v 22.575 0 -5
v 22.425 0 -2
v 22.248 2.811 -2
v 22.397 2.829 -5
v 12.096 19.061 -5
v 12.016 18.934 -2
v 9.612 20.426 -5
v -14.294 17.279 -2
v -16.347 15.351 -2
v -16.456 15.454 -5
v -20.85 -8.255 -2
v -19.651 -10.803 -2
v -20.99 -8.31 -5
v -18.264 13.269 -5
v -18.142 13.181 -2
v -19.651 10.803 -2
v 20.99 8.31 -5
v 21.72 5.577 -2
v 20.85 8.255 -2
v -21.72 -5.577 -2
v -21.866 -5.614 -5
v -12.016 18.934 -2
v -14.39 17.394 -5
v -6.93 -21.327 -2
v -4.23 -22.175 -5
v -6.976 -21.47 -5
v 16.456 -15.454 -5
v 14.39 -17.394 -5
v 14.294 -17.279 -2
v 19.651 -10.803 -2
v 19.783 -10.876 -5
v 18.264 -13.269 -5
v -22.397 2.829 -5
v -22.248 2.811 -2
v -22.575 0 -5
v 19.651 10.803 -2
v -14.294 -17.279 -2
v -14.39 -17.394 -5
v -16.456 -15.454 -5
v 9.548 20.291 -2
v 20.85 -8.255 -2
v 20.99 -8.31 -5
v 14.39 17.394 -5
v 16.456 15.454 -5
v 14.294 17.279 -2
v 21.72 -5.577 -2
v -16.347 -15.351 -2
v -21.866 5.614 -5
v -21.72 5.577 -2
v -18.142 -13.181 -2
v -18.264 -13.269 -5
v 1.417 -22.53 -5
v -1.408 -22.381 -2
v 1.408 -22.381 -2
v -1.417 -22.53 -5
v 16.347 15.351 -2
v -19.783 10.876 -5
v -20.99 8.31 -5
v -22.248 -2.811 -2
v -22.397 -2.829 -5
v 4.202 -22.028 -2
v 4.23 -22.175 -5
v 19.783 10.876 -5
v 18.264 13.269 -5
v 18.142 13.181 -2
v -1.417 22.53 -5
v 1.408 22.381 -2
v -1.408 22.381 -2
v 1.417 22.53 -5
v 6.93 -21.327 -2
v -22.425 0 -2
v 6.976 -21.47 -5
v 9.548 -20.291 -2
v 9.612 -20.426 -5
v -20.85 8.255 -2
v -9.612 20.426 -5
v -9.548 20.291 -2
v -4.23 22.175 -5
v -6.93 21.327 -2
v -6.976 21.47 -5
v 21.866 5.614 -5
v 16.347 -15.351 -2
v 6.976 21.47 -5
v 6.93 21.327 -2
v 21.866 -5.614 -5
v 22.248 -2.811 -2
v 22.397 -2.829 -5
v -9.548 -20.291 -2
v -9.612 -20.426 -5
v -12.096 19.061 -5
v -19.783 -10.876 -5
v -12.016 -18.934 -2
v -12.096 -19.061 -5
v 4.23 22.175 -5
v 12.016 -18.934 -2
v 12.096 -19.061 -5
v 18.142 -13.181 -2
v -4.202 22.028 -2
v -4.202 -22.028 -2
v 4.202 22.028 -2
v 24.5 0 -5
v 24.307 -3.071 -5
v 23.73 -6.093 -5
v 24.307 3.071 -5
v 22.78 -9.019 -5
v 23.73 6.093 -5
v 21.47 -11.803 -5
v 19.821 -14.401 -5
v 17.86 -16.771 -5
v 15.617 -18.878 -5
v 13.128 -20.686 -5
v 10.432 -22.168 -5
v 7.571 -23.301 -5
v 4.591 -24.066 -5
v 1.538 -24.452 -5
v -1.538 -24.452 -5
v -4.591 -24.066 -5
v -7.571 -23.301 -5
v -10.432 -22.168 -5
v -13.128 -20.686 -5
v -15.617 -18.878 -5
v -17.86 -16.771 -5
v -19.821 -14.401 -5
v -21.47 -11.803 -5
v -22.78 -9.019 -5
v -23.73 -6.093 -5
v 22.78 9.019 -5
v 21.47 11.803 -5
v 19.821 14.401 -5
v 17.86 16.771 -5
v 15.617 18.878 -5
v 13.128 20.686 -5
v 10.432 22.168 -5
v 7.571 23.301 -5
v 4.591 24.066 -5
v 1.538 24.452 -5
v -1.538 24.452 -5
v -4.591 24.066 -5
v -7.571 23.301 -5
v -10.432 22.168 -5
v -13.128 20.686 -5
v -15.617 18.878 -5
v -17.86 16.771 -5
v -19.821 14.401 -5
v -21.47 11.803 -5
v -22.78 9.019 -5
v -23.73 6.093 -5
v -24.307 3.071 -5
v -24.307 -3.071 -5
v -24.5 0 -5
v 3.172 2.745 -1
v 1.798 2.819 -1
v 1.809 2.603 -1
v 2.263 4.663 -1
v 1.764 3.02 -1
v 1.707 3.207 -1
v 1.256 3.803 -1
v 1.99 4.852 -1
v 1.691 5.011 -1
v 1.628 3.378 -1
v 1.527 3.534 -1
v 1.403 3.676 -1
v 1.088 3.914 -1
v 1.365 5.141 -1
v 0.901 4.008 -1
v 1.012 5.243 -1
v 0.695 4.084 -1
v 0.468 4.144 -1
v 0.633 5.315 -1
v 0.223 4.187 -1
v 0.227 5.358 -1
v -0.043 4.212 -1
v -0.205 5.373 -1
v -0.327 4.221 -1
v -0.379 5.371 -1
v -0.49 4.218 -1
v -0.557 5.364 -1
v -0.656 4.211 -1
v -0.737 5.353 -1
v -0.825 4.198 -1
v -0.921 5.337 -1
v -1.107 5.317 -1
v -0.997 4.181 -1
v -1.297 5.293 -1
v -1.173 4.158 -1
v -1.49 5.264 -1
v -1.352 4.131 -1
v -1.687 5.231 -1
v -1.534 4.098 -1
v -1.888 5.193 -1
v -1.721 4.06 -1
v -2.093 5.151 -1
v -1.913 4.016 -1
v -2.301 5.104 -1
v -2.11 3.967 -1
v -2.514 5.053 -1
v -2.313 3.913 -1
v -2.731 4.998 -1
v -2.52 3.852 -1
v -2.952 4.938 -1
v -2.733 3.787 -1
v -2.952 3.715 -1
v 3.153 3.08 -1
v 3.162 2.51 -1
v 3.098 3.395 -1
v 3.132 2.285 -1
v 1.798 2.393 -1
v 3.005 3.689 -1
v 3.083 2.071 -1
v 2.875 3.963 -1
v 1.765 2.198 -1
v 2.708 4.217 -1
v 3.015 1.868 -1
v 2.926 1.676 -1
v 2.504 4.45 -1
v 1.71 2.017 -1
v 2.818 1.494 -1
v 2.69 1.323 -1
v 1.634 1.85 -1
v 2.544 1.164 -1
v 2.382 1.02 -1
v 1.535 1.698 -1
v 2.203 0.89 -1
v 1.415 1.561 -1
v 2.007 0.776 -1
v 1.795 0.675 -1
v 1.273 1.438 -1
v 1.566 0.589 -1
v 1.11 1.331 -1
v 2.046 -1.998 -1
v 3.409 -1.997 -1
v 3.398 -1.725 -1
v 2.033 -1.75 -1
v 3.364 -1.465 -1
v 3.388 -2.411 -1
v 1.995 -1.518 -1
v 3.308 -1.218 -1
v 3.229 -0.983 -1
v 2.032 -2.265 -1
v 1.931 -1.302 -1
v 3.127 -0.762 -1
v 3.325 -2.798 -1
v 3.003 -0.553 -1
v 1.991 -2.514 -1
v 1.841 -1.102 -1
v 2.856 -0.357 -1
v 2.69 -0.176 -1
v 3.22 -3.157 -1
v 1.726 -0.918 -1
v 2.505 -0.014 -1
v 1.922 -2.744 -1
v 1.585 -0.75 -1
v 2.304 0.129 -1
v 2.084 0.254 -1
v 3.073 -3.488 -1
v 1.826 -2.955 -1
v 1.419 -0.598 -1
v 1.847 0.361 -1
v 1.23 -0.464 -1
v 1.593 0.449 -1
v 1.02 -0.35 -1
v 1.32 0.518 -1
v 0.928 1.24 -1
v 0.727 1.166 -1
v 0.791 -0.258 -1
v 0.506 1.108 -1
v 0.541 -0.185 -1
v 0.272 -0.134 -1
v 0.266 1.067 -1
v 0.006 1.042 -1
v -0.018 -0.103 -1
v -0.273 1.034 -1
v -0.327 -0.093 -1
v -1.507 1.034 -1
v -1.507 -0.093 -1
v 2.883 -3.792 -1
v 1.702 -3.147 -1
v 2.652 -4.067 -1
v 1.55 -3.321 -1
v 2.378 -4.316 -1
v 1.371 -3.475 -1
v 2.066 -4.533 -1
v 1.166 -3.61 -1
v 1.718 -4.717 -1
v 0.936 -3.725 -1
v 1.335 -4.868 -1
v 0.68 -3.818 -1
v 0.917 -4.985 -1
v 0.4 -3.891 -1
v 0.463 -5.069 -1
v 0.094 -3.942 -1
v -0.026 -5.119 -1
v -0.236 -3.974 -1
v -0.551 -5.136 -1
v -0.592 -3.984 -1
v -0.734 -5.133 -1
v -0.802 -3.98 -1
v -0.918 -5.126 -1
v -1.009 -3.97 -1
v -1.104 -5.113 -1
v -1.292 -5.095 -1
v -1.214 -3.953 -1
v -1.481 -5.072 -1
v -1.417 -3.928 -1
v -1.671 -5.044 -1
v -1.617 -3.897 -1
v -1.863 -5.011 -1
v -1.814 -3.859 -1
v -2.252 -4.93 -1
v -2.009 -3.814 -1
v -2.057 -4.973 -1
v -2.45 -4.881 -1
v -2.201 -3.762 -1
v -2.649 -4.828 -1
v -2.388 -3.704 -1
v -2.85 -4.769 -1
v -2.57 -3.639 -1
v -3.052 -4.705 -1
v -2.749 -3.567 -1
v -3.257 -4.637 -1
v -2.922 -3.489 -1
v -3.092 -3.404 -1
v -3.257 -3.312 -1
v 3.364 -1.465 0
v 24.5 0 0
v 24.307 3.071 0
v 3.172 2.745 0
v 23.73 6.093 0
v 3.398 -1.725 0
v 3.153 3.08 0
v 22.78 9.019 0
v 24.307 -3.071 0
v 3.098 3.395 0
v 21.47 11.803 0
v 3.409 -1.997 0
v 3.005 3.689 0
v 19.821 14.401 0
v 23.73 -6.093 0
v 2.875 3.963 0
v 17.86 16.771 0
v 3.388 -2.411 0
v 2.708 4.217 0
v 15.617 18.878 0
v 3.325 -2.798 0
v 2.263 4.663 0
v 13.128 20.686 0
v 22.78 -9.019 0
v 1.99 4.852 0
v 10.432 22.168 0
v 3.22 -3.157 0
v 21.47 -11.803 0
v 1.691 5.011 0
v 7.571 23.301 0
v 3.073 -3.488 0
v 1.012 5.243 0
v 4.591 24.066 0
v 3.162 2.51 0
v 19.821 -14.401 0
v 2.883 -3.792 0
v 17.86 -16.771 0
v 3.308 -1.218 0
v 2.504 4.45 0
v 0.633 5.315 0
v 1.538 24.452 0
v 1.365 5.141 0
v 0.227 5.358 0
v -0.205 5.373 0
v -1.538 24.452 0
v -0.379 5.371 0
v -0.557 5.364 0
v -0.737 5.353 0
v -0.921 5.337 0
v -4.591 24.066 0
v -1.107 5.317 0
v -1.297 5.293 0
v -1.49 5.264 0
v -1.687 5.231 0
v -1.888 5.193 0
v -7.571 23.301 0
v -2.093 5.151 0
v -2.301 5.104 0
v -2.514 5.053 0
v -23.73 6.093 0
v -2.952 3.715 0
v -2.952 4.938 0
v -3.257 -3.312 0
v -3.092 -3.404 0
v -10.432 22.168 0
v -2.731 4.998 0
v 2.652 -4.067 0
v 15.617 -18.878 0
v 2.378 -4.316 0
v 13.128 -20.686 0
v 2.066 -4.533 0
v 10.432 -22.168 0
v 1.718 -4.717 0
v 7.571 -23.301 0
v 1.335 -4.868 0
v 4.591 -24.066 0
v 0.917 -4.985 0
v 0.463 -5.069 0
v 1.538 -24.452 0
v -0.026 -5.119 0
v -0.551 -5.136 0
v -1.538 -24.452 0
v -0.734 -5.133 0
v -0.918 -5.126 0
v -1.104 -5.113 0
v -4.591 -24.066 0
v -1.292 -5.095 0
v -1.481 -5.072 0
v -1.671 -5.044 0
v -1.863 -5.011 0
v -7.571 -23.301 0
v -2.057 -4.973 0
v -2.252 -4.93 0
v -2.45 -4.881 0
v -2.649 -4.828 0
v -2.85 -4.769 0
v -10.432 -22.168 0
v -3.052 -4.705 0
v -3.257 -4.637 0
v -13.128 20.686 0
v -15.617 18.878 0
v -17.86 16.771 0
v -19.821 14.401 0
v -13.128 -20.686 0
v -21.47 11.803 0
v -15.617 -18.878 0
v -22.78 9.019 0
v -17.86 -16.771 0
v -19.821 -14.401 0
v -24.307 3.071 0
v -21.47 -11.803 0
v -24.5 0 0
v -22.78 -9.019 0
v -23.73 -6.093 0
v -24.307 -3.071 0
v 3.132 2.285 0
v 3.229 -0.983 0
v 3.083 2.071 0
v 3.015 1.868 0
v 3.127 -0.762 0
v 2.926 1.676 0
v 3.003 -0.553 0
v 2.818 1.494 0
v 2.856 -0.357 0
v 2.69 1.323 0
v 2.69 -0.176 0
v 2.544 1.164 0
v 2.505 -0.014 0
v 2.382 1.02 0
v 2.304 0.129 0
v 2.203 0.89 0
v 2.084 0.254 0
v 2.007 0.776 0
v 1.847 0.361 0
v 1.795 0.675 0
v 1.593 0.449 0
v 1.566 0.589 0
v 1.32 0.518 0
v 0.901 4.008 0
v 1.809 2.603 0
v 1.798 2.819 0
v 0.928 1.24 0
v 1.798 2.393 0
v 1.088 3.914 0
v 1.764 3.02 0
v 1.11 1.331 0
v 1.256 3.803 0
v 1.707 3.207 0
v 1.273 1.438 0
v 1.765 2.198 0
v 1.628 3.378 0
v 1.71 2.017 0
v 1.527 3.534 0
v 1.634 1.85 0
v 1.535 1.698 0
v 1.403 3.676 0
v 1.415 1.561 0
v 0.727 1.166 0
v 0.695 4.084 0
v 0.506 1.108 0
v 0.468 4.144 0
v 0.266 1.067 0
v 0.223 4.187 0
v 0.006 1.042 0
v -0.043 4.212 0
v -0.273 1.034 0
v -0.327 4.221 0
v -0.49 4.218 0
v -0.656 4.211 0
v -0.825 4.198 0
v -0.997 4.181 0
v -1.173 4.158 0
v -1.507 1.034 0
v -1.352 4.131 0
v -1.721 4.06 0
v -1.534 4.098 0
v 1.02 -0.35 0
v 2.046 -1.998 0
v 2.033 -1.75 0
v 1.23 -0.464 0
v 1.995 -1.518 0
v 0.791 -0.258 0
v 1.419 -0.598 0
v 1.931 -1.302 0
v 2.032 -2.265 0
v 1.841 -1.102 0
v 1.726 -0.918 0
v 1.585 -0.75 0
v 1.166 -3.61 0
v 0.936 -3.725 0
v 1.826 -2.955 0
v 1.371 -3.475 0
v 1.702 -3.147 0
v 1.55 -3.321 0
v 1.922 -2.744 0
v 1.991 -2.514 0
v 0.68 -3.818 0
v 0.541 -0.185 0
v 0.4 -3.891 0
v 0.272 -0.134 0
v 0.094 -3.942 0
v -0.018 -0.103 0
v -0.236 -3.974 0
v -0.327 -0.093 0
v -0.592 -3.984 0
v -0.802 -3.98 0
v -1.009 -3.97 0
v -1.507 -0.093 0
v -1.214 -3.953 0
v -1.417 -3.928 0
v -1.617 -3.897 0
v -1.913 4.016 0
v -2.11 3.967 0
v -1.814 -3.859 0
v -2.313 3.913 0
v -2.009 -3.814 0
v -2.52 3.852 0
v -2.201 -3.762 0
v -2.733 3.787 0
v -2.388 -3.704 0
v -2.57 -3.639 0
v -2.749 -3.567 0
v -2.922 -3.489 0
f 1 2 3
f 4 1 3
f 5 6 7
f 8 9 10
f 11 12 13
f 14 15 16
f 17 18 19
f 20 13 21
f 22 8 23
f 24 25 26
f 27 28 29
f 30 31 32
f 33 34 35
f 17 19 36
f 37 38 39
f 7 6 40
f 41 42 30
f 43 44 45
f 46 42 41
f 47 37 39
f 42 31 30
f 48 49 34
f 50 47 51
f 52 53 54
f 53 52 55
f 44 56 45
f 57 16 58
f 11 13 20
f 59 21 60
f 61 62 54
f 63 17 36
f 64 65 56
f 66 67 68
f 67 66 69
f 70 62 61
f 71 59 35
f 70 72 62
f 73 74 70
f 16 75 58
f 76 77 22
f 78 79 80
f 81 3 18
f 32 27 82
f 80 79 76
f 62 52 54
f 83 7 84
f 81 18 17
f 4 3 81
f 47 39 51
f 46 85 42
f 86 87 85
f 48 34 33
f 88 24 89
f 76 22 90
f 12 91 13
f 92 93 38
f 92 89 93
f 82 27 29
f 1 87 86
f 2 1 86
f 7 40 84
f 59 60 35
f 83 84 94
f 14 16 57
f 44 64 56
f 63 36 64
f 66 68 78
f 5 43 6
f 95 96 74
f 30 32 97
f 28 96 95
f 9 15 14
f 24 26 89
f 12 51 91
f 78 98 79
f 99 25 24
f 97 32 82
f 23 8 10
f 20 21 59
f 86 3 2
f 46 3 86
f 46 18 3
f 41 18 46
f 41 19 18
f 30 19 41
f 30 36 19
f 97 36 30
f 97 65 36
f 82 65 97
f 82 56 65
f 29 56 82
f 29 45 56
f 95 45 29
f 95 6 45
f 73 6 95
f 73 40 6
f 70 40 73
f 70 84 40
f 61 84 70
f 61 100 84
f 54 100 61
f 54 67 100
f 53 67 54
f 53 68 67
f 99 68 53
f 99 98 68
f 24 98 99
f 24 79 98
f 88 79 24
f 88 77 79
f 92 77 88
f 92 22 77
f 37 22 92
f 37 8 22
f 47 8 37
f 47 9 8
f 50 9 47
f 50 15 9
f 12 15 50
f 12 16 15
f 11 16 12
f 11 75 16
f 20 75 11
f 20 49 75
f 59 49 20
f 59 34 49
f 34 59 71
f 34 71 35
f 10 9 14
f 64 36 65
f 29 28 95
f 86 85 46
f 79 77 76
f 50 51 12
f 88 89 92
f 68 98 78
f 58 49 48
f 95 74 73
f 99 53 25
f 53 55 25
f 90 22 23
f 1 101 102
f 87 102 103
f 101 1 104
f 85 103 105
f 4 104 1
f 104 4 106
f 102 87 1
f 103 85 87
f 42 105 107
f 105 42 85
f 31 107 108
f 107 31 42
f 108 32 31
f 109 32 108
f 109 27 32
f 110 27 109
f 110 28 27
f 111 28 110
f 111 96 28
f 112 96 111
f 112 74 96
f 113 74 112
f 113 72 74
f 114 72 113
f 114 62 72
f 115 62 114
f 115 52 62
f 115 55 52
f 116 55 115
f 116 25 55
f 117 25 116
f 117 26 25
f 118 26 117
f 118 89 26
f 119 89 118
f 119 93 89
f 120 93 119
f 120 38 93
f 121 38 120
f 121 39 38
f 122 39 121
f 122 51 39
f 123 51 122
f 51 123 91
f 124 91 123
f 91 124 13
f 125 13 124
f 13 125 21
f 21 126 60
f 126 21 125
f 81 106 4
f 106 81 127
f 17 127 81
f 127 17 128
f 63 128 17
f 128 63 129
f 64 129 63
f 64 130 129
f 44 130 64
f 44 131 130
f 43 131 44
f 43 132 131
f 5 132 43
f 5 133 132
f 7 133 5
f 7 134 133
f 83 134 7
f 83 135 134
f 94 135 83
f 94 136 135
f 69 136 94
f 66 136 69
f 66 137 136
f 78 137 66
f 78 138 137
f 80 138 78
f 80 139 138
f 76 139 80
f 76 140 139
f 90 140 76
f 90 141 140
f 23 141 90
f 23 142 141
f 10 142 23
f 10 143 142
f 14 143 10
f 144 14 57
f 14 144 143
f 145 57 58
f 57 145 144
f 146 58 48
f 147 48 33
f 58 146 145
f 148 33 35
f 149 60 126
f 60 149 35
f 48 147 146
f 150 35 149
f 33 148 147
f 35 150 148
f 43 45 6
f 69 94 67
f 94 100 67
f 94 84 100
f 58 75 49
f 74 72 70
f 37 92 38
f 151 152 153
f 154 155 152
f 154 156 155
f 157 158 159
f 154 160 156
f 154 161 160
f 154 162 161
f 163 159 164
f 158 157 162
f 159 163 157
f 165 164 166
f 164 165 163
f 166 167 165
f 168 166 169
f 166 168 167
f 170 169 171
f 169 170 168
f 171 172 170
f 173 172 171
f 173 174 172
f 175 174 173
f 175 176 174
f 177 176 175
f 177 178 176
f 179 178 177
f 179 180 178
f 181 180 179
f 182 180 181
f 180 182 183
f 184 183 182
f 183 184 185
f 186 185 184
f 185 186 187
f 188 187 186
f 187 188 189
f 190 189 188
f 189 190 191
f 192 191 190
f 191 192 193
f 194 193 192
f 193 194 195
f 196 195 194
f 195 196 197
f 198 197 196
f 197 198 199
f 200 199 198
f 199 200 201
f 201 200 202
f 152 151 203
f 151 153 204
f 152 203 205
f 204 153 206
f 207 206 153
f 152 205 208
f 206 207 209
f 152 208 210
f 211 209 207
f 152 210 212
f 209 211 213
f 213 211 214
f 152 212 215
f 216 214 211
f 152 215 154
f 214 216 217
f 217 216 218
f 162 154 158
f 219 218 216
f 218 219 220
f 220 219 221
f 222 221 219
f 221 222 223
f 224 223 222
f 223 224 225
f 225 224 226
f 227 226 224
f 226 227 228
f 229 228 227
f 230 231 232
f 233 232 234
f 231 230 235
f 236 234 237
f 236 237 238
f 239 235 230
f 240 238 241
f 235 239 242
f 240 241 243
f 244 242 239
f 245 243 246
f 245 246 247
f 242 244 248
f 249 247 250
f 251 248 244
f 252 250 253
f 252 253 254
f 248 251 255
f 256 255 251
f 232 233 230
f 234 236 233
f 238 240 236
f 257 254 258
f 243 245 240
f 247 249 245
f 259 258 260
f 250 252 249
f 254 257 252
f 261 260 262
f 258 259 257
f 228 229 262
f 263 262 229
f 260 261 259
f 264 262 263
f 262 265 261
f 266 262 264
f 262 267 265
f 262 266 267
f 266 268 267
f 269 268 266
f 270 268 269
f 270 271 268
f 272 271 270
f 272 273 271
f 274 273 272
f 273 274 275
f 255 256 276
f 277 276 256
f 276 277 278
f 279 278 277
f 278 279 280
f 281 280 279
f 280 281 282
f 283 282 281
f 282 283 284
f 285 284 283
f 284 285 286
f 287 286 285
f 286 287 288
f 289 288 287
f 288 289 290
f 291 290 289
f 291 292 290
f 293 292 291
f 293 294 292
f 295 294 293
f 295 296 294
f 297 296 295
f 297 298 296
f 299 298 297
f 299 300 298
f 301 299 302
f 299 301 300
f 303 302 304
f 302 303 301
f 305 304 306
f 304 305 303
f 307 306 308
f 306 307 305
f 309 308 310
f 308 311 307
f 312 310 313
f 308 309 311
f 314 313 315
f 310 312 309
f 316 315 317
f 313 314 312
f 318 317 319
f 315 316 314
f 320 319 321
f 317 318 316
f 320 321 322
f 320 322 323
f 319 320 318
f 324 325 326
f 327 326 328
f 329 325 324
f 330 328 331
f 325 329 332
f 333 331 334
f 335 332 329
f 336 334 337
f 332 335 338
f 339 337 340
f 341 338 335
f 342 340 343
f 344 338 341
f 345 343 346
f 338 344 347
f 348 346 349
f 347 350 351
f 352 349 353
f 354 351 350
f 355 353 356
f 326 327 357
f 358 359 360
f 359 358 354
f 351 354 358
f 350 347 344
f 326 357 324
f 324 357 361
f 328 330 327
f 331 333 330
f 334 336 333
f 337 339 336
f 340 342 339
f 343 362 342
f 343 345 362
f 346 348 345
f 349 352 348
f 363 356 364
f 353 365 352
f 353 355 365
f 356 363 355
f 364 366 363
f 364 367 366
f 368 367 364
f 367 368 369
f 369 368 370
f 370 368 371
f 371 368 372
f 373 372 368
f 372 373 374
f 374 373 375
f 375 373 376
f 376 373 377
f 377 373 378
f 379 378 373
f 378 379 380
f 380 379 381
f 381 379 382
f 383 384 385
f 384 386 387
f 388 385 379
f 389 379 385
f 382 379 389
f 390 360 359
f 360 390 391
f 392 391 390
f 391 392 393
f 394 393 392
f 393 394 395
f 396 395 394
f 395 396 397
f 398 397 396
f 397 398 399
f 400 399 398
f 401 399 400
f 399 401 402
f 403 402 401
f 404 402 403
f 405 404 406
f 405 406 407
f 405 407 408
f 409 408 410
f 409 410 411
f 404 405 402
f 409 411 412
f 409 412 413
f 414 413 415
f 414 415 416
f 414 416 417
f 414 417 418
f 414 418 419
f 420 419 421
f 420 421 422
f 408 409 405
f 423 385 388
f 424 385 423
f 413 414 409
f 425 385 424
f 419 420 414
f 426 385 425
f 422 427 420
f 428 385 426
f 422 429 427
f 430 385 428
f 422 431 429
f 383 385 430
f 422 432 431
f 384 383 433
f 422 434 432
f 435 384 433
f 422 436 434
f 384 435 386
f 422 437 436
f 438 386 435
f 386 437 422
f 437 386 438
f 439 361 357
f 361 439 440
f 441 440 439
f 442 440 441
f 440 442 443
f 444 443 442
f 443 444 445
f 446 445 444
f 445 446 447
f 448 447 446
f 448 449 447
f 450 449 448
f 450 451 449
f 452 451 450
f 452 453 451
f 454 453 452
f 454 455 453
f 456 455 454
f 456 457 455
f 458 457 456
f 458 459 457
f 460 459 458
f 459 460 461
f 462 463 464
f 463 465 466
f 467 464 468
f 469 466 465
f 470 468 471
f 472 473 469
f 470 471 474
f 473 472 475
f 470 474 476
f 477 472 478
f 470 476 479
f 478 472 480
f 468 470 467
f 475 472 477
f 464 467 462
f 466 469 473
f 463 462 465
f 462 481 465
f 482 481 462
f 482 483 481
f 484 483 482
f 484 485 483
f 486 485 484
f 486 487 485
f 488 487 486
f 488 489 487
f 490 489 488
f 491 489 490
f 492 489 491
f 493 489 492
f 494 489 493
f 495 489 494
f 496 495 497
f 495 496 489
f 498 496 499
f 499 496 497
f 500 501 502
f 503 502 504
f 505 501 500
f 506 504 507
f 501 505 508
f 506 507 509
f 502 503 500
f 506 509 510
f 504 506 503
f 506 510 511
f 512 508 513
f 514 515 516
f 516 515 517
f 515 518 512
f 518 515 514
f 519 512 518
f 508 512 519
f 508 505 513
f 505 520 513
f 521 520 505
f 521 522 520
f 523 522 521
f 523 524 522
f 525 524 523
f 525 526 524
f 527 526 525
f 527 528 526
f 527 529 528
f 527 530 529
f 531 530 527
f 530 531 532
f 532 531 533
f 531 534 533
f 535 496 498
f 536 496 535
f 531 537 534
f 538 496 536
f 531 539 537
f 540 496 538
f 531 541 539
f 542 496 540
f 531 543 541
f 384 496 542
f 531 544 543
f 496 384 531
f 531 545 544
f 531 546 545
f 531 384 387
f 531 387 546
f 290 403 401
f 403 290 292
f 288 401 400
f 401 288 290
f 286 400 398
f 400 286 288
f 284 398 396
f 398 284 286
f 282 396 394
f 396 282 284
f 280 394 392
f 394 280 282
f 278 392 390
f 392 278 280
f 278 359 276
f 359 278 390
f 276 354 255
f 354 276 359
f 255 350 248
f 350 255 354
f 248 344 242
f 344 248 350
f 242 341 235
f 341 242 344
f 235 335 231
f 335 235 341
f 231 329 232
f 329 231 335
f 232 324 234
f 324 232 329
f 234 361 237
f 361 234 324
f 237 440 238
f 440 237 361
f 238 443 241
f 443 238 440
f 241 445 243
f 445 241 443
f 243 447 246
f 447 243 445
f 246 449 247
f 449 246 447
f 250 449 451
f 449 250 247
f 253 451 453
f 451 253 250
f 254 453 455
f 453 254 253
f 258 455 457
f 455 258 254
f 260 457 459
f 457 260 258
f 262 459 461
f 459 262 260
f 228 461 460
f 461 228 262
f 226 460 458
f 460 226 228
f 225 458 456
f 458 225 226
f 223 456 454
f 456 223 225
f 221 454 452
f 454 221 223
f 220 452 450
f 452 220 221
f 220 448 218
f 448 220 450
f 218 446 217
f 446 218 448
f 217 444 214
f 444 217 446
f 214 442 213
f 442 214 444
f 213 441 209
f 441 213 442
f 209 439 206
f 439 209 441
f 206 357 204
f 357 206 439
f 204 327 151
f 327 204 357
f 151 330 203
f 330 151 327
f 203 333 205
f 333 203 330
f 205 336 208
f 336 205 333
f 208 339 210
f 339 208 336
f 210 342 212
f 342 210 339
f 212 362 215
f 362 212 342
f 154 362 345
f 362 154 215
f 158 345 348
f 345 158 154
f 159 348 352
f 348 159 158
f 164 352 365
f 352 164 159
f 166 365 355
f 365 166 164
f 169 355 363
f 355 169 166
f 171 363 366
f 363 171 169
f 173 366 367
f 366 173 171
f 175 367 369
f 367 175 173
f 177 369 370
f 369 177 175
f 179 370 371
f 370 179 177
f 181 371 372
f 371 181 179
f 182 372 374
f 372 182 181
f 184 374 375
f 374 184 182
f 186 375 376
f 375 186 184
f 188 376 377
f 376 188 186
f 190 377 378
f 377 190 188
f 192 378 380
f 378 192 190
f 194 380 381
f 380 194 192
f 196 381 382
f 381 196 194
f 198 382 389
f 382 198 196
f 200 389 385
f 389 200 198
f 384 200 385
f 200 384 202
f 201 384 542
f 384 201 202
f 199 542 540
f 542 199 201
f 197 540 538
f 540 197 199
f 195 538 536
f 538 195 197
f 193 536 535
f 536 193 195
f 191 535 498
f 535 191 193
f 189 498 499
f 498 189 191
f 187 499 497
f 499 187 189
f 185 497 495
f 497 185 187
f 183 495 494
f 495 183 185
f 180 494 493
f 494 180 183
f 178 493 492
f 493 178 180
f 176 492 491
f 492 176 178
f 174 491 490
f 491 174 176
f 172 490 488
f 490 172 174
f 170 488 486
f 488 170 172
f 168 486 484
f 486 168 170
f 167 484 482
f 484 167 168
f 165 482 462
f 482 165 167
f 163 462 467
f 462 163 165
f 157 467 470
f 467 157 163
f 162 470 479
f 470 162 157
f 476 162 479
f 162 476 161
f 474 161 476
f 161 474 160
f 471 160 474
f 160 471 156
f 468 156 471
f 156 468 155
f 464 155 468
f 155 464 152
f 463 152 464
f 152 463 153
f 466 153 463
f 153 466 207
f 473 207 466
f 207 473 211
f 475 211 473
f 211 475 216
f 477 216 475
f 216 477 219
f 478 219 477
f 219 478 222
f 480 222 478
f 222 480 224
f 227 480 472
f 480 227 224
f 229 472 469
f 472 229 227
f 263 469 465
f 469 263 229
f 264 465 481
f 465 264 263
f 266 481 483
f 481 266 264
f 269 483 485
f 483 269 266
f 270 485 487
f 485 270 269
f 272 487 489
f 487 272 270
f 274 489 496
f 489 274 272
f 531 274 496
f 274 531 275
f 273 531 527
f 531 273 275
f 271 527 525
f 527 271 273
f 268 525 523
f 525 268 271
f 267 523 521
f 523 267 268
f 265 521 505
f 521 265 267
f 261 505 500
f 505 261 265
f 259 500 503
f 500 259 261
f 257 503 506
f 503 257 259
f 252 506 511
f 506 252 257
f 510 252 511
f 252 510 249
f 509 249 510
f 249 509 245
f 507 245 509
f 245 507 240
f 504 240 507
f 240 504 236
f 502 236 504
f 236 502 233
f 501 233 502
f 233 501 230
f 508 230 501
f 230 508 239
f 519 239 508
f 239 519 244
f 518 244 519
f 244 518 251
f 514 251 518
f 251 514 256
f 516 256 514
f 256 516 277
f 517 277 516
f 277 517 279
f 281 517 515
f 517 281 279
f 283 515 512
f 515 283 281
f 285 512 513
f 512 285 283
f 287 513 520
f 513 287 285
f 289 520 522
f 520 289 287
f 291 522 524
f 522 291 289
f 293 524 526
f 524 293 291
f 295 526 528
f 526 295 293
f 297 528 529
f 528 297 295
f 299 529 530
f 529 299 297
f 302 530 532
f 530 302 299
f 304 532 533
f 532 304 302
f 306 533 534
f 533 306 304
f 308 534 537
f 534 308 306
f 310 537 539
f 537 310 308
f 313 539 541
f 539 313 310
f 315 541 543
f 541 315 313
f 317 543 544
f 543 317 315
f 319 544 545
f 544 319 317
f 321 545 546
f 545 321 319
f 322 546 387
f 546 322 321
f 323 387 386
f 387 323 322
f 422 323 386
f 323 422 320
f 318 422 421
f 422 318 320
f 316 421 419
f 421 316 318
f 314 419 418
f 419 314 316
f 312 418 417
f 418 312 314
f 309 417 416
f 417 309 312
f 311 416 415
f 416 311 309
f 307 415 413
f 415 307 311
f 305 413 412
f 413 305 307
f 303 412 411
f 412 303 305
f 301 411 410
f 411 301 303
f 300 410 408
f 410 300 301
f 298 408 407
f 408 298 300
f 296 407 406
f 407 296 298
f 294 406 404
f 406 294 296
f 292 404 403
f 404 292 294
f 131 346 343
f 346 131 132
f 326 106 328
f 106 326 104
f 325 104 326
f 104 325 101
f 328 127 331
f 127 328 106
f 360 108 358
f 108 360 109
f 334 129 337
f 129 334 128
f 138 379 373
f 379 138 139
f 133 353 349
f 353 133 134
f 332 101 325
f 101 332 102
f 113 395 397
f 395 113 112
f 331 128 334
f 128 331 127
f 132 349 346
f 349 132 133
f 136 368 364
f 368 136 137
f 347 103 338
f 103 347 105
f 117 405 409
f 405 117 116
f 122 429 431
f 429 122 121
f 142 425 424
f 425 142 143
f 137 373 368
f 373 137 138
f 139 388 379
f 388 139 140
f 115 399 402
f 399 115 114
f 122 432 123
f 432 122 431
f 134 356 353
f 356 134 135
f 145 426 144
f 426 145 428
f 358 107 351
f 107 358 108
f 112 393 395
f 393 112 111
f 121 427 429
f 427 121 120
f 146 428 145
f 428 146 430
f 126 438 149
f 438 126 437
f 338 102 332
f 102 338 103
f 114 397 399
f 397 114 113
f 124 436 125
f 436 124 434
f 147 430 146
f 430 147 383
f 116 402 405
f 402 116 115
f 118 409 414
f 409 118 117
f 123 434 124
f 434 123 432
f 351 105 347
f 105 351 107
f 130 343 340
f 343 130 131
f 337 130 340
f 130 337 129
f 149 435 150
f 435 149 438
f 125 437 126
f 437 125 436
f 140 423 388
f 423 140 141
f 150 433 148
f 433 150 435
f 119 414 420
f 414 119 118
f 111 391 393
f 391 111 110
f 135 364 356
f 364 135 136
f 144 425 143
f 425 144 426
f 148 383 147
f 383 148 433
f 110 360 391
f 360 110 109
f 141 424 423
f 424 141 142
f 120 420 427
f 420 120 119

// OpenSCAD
$fn = 50;

difference() {
	union() {
		translate(v = [0, 0, -5.0]) {
			cylinder(h = 5, r = 24.5);
		}
	}
	union() {
		#translate(v = [0, 0, -5.0]) {
			cylinder(h = 3, r1 = 22.575, r2 = 22.425);
		}
		translate(v = [0, 0, -1]) {
			linear_extrude(height = 1) {
				text(font = "Impact", halign = "center", size = 10, text = "3", valign = "center");
			}
		}
	}
}
